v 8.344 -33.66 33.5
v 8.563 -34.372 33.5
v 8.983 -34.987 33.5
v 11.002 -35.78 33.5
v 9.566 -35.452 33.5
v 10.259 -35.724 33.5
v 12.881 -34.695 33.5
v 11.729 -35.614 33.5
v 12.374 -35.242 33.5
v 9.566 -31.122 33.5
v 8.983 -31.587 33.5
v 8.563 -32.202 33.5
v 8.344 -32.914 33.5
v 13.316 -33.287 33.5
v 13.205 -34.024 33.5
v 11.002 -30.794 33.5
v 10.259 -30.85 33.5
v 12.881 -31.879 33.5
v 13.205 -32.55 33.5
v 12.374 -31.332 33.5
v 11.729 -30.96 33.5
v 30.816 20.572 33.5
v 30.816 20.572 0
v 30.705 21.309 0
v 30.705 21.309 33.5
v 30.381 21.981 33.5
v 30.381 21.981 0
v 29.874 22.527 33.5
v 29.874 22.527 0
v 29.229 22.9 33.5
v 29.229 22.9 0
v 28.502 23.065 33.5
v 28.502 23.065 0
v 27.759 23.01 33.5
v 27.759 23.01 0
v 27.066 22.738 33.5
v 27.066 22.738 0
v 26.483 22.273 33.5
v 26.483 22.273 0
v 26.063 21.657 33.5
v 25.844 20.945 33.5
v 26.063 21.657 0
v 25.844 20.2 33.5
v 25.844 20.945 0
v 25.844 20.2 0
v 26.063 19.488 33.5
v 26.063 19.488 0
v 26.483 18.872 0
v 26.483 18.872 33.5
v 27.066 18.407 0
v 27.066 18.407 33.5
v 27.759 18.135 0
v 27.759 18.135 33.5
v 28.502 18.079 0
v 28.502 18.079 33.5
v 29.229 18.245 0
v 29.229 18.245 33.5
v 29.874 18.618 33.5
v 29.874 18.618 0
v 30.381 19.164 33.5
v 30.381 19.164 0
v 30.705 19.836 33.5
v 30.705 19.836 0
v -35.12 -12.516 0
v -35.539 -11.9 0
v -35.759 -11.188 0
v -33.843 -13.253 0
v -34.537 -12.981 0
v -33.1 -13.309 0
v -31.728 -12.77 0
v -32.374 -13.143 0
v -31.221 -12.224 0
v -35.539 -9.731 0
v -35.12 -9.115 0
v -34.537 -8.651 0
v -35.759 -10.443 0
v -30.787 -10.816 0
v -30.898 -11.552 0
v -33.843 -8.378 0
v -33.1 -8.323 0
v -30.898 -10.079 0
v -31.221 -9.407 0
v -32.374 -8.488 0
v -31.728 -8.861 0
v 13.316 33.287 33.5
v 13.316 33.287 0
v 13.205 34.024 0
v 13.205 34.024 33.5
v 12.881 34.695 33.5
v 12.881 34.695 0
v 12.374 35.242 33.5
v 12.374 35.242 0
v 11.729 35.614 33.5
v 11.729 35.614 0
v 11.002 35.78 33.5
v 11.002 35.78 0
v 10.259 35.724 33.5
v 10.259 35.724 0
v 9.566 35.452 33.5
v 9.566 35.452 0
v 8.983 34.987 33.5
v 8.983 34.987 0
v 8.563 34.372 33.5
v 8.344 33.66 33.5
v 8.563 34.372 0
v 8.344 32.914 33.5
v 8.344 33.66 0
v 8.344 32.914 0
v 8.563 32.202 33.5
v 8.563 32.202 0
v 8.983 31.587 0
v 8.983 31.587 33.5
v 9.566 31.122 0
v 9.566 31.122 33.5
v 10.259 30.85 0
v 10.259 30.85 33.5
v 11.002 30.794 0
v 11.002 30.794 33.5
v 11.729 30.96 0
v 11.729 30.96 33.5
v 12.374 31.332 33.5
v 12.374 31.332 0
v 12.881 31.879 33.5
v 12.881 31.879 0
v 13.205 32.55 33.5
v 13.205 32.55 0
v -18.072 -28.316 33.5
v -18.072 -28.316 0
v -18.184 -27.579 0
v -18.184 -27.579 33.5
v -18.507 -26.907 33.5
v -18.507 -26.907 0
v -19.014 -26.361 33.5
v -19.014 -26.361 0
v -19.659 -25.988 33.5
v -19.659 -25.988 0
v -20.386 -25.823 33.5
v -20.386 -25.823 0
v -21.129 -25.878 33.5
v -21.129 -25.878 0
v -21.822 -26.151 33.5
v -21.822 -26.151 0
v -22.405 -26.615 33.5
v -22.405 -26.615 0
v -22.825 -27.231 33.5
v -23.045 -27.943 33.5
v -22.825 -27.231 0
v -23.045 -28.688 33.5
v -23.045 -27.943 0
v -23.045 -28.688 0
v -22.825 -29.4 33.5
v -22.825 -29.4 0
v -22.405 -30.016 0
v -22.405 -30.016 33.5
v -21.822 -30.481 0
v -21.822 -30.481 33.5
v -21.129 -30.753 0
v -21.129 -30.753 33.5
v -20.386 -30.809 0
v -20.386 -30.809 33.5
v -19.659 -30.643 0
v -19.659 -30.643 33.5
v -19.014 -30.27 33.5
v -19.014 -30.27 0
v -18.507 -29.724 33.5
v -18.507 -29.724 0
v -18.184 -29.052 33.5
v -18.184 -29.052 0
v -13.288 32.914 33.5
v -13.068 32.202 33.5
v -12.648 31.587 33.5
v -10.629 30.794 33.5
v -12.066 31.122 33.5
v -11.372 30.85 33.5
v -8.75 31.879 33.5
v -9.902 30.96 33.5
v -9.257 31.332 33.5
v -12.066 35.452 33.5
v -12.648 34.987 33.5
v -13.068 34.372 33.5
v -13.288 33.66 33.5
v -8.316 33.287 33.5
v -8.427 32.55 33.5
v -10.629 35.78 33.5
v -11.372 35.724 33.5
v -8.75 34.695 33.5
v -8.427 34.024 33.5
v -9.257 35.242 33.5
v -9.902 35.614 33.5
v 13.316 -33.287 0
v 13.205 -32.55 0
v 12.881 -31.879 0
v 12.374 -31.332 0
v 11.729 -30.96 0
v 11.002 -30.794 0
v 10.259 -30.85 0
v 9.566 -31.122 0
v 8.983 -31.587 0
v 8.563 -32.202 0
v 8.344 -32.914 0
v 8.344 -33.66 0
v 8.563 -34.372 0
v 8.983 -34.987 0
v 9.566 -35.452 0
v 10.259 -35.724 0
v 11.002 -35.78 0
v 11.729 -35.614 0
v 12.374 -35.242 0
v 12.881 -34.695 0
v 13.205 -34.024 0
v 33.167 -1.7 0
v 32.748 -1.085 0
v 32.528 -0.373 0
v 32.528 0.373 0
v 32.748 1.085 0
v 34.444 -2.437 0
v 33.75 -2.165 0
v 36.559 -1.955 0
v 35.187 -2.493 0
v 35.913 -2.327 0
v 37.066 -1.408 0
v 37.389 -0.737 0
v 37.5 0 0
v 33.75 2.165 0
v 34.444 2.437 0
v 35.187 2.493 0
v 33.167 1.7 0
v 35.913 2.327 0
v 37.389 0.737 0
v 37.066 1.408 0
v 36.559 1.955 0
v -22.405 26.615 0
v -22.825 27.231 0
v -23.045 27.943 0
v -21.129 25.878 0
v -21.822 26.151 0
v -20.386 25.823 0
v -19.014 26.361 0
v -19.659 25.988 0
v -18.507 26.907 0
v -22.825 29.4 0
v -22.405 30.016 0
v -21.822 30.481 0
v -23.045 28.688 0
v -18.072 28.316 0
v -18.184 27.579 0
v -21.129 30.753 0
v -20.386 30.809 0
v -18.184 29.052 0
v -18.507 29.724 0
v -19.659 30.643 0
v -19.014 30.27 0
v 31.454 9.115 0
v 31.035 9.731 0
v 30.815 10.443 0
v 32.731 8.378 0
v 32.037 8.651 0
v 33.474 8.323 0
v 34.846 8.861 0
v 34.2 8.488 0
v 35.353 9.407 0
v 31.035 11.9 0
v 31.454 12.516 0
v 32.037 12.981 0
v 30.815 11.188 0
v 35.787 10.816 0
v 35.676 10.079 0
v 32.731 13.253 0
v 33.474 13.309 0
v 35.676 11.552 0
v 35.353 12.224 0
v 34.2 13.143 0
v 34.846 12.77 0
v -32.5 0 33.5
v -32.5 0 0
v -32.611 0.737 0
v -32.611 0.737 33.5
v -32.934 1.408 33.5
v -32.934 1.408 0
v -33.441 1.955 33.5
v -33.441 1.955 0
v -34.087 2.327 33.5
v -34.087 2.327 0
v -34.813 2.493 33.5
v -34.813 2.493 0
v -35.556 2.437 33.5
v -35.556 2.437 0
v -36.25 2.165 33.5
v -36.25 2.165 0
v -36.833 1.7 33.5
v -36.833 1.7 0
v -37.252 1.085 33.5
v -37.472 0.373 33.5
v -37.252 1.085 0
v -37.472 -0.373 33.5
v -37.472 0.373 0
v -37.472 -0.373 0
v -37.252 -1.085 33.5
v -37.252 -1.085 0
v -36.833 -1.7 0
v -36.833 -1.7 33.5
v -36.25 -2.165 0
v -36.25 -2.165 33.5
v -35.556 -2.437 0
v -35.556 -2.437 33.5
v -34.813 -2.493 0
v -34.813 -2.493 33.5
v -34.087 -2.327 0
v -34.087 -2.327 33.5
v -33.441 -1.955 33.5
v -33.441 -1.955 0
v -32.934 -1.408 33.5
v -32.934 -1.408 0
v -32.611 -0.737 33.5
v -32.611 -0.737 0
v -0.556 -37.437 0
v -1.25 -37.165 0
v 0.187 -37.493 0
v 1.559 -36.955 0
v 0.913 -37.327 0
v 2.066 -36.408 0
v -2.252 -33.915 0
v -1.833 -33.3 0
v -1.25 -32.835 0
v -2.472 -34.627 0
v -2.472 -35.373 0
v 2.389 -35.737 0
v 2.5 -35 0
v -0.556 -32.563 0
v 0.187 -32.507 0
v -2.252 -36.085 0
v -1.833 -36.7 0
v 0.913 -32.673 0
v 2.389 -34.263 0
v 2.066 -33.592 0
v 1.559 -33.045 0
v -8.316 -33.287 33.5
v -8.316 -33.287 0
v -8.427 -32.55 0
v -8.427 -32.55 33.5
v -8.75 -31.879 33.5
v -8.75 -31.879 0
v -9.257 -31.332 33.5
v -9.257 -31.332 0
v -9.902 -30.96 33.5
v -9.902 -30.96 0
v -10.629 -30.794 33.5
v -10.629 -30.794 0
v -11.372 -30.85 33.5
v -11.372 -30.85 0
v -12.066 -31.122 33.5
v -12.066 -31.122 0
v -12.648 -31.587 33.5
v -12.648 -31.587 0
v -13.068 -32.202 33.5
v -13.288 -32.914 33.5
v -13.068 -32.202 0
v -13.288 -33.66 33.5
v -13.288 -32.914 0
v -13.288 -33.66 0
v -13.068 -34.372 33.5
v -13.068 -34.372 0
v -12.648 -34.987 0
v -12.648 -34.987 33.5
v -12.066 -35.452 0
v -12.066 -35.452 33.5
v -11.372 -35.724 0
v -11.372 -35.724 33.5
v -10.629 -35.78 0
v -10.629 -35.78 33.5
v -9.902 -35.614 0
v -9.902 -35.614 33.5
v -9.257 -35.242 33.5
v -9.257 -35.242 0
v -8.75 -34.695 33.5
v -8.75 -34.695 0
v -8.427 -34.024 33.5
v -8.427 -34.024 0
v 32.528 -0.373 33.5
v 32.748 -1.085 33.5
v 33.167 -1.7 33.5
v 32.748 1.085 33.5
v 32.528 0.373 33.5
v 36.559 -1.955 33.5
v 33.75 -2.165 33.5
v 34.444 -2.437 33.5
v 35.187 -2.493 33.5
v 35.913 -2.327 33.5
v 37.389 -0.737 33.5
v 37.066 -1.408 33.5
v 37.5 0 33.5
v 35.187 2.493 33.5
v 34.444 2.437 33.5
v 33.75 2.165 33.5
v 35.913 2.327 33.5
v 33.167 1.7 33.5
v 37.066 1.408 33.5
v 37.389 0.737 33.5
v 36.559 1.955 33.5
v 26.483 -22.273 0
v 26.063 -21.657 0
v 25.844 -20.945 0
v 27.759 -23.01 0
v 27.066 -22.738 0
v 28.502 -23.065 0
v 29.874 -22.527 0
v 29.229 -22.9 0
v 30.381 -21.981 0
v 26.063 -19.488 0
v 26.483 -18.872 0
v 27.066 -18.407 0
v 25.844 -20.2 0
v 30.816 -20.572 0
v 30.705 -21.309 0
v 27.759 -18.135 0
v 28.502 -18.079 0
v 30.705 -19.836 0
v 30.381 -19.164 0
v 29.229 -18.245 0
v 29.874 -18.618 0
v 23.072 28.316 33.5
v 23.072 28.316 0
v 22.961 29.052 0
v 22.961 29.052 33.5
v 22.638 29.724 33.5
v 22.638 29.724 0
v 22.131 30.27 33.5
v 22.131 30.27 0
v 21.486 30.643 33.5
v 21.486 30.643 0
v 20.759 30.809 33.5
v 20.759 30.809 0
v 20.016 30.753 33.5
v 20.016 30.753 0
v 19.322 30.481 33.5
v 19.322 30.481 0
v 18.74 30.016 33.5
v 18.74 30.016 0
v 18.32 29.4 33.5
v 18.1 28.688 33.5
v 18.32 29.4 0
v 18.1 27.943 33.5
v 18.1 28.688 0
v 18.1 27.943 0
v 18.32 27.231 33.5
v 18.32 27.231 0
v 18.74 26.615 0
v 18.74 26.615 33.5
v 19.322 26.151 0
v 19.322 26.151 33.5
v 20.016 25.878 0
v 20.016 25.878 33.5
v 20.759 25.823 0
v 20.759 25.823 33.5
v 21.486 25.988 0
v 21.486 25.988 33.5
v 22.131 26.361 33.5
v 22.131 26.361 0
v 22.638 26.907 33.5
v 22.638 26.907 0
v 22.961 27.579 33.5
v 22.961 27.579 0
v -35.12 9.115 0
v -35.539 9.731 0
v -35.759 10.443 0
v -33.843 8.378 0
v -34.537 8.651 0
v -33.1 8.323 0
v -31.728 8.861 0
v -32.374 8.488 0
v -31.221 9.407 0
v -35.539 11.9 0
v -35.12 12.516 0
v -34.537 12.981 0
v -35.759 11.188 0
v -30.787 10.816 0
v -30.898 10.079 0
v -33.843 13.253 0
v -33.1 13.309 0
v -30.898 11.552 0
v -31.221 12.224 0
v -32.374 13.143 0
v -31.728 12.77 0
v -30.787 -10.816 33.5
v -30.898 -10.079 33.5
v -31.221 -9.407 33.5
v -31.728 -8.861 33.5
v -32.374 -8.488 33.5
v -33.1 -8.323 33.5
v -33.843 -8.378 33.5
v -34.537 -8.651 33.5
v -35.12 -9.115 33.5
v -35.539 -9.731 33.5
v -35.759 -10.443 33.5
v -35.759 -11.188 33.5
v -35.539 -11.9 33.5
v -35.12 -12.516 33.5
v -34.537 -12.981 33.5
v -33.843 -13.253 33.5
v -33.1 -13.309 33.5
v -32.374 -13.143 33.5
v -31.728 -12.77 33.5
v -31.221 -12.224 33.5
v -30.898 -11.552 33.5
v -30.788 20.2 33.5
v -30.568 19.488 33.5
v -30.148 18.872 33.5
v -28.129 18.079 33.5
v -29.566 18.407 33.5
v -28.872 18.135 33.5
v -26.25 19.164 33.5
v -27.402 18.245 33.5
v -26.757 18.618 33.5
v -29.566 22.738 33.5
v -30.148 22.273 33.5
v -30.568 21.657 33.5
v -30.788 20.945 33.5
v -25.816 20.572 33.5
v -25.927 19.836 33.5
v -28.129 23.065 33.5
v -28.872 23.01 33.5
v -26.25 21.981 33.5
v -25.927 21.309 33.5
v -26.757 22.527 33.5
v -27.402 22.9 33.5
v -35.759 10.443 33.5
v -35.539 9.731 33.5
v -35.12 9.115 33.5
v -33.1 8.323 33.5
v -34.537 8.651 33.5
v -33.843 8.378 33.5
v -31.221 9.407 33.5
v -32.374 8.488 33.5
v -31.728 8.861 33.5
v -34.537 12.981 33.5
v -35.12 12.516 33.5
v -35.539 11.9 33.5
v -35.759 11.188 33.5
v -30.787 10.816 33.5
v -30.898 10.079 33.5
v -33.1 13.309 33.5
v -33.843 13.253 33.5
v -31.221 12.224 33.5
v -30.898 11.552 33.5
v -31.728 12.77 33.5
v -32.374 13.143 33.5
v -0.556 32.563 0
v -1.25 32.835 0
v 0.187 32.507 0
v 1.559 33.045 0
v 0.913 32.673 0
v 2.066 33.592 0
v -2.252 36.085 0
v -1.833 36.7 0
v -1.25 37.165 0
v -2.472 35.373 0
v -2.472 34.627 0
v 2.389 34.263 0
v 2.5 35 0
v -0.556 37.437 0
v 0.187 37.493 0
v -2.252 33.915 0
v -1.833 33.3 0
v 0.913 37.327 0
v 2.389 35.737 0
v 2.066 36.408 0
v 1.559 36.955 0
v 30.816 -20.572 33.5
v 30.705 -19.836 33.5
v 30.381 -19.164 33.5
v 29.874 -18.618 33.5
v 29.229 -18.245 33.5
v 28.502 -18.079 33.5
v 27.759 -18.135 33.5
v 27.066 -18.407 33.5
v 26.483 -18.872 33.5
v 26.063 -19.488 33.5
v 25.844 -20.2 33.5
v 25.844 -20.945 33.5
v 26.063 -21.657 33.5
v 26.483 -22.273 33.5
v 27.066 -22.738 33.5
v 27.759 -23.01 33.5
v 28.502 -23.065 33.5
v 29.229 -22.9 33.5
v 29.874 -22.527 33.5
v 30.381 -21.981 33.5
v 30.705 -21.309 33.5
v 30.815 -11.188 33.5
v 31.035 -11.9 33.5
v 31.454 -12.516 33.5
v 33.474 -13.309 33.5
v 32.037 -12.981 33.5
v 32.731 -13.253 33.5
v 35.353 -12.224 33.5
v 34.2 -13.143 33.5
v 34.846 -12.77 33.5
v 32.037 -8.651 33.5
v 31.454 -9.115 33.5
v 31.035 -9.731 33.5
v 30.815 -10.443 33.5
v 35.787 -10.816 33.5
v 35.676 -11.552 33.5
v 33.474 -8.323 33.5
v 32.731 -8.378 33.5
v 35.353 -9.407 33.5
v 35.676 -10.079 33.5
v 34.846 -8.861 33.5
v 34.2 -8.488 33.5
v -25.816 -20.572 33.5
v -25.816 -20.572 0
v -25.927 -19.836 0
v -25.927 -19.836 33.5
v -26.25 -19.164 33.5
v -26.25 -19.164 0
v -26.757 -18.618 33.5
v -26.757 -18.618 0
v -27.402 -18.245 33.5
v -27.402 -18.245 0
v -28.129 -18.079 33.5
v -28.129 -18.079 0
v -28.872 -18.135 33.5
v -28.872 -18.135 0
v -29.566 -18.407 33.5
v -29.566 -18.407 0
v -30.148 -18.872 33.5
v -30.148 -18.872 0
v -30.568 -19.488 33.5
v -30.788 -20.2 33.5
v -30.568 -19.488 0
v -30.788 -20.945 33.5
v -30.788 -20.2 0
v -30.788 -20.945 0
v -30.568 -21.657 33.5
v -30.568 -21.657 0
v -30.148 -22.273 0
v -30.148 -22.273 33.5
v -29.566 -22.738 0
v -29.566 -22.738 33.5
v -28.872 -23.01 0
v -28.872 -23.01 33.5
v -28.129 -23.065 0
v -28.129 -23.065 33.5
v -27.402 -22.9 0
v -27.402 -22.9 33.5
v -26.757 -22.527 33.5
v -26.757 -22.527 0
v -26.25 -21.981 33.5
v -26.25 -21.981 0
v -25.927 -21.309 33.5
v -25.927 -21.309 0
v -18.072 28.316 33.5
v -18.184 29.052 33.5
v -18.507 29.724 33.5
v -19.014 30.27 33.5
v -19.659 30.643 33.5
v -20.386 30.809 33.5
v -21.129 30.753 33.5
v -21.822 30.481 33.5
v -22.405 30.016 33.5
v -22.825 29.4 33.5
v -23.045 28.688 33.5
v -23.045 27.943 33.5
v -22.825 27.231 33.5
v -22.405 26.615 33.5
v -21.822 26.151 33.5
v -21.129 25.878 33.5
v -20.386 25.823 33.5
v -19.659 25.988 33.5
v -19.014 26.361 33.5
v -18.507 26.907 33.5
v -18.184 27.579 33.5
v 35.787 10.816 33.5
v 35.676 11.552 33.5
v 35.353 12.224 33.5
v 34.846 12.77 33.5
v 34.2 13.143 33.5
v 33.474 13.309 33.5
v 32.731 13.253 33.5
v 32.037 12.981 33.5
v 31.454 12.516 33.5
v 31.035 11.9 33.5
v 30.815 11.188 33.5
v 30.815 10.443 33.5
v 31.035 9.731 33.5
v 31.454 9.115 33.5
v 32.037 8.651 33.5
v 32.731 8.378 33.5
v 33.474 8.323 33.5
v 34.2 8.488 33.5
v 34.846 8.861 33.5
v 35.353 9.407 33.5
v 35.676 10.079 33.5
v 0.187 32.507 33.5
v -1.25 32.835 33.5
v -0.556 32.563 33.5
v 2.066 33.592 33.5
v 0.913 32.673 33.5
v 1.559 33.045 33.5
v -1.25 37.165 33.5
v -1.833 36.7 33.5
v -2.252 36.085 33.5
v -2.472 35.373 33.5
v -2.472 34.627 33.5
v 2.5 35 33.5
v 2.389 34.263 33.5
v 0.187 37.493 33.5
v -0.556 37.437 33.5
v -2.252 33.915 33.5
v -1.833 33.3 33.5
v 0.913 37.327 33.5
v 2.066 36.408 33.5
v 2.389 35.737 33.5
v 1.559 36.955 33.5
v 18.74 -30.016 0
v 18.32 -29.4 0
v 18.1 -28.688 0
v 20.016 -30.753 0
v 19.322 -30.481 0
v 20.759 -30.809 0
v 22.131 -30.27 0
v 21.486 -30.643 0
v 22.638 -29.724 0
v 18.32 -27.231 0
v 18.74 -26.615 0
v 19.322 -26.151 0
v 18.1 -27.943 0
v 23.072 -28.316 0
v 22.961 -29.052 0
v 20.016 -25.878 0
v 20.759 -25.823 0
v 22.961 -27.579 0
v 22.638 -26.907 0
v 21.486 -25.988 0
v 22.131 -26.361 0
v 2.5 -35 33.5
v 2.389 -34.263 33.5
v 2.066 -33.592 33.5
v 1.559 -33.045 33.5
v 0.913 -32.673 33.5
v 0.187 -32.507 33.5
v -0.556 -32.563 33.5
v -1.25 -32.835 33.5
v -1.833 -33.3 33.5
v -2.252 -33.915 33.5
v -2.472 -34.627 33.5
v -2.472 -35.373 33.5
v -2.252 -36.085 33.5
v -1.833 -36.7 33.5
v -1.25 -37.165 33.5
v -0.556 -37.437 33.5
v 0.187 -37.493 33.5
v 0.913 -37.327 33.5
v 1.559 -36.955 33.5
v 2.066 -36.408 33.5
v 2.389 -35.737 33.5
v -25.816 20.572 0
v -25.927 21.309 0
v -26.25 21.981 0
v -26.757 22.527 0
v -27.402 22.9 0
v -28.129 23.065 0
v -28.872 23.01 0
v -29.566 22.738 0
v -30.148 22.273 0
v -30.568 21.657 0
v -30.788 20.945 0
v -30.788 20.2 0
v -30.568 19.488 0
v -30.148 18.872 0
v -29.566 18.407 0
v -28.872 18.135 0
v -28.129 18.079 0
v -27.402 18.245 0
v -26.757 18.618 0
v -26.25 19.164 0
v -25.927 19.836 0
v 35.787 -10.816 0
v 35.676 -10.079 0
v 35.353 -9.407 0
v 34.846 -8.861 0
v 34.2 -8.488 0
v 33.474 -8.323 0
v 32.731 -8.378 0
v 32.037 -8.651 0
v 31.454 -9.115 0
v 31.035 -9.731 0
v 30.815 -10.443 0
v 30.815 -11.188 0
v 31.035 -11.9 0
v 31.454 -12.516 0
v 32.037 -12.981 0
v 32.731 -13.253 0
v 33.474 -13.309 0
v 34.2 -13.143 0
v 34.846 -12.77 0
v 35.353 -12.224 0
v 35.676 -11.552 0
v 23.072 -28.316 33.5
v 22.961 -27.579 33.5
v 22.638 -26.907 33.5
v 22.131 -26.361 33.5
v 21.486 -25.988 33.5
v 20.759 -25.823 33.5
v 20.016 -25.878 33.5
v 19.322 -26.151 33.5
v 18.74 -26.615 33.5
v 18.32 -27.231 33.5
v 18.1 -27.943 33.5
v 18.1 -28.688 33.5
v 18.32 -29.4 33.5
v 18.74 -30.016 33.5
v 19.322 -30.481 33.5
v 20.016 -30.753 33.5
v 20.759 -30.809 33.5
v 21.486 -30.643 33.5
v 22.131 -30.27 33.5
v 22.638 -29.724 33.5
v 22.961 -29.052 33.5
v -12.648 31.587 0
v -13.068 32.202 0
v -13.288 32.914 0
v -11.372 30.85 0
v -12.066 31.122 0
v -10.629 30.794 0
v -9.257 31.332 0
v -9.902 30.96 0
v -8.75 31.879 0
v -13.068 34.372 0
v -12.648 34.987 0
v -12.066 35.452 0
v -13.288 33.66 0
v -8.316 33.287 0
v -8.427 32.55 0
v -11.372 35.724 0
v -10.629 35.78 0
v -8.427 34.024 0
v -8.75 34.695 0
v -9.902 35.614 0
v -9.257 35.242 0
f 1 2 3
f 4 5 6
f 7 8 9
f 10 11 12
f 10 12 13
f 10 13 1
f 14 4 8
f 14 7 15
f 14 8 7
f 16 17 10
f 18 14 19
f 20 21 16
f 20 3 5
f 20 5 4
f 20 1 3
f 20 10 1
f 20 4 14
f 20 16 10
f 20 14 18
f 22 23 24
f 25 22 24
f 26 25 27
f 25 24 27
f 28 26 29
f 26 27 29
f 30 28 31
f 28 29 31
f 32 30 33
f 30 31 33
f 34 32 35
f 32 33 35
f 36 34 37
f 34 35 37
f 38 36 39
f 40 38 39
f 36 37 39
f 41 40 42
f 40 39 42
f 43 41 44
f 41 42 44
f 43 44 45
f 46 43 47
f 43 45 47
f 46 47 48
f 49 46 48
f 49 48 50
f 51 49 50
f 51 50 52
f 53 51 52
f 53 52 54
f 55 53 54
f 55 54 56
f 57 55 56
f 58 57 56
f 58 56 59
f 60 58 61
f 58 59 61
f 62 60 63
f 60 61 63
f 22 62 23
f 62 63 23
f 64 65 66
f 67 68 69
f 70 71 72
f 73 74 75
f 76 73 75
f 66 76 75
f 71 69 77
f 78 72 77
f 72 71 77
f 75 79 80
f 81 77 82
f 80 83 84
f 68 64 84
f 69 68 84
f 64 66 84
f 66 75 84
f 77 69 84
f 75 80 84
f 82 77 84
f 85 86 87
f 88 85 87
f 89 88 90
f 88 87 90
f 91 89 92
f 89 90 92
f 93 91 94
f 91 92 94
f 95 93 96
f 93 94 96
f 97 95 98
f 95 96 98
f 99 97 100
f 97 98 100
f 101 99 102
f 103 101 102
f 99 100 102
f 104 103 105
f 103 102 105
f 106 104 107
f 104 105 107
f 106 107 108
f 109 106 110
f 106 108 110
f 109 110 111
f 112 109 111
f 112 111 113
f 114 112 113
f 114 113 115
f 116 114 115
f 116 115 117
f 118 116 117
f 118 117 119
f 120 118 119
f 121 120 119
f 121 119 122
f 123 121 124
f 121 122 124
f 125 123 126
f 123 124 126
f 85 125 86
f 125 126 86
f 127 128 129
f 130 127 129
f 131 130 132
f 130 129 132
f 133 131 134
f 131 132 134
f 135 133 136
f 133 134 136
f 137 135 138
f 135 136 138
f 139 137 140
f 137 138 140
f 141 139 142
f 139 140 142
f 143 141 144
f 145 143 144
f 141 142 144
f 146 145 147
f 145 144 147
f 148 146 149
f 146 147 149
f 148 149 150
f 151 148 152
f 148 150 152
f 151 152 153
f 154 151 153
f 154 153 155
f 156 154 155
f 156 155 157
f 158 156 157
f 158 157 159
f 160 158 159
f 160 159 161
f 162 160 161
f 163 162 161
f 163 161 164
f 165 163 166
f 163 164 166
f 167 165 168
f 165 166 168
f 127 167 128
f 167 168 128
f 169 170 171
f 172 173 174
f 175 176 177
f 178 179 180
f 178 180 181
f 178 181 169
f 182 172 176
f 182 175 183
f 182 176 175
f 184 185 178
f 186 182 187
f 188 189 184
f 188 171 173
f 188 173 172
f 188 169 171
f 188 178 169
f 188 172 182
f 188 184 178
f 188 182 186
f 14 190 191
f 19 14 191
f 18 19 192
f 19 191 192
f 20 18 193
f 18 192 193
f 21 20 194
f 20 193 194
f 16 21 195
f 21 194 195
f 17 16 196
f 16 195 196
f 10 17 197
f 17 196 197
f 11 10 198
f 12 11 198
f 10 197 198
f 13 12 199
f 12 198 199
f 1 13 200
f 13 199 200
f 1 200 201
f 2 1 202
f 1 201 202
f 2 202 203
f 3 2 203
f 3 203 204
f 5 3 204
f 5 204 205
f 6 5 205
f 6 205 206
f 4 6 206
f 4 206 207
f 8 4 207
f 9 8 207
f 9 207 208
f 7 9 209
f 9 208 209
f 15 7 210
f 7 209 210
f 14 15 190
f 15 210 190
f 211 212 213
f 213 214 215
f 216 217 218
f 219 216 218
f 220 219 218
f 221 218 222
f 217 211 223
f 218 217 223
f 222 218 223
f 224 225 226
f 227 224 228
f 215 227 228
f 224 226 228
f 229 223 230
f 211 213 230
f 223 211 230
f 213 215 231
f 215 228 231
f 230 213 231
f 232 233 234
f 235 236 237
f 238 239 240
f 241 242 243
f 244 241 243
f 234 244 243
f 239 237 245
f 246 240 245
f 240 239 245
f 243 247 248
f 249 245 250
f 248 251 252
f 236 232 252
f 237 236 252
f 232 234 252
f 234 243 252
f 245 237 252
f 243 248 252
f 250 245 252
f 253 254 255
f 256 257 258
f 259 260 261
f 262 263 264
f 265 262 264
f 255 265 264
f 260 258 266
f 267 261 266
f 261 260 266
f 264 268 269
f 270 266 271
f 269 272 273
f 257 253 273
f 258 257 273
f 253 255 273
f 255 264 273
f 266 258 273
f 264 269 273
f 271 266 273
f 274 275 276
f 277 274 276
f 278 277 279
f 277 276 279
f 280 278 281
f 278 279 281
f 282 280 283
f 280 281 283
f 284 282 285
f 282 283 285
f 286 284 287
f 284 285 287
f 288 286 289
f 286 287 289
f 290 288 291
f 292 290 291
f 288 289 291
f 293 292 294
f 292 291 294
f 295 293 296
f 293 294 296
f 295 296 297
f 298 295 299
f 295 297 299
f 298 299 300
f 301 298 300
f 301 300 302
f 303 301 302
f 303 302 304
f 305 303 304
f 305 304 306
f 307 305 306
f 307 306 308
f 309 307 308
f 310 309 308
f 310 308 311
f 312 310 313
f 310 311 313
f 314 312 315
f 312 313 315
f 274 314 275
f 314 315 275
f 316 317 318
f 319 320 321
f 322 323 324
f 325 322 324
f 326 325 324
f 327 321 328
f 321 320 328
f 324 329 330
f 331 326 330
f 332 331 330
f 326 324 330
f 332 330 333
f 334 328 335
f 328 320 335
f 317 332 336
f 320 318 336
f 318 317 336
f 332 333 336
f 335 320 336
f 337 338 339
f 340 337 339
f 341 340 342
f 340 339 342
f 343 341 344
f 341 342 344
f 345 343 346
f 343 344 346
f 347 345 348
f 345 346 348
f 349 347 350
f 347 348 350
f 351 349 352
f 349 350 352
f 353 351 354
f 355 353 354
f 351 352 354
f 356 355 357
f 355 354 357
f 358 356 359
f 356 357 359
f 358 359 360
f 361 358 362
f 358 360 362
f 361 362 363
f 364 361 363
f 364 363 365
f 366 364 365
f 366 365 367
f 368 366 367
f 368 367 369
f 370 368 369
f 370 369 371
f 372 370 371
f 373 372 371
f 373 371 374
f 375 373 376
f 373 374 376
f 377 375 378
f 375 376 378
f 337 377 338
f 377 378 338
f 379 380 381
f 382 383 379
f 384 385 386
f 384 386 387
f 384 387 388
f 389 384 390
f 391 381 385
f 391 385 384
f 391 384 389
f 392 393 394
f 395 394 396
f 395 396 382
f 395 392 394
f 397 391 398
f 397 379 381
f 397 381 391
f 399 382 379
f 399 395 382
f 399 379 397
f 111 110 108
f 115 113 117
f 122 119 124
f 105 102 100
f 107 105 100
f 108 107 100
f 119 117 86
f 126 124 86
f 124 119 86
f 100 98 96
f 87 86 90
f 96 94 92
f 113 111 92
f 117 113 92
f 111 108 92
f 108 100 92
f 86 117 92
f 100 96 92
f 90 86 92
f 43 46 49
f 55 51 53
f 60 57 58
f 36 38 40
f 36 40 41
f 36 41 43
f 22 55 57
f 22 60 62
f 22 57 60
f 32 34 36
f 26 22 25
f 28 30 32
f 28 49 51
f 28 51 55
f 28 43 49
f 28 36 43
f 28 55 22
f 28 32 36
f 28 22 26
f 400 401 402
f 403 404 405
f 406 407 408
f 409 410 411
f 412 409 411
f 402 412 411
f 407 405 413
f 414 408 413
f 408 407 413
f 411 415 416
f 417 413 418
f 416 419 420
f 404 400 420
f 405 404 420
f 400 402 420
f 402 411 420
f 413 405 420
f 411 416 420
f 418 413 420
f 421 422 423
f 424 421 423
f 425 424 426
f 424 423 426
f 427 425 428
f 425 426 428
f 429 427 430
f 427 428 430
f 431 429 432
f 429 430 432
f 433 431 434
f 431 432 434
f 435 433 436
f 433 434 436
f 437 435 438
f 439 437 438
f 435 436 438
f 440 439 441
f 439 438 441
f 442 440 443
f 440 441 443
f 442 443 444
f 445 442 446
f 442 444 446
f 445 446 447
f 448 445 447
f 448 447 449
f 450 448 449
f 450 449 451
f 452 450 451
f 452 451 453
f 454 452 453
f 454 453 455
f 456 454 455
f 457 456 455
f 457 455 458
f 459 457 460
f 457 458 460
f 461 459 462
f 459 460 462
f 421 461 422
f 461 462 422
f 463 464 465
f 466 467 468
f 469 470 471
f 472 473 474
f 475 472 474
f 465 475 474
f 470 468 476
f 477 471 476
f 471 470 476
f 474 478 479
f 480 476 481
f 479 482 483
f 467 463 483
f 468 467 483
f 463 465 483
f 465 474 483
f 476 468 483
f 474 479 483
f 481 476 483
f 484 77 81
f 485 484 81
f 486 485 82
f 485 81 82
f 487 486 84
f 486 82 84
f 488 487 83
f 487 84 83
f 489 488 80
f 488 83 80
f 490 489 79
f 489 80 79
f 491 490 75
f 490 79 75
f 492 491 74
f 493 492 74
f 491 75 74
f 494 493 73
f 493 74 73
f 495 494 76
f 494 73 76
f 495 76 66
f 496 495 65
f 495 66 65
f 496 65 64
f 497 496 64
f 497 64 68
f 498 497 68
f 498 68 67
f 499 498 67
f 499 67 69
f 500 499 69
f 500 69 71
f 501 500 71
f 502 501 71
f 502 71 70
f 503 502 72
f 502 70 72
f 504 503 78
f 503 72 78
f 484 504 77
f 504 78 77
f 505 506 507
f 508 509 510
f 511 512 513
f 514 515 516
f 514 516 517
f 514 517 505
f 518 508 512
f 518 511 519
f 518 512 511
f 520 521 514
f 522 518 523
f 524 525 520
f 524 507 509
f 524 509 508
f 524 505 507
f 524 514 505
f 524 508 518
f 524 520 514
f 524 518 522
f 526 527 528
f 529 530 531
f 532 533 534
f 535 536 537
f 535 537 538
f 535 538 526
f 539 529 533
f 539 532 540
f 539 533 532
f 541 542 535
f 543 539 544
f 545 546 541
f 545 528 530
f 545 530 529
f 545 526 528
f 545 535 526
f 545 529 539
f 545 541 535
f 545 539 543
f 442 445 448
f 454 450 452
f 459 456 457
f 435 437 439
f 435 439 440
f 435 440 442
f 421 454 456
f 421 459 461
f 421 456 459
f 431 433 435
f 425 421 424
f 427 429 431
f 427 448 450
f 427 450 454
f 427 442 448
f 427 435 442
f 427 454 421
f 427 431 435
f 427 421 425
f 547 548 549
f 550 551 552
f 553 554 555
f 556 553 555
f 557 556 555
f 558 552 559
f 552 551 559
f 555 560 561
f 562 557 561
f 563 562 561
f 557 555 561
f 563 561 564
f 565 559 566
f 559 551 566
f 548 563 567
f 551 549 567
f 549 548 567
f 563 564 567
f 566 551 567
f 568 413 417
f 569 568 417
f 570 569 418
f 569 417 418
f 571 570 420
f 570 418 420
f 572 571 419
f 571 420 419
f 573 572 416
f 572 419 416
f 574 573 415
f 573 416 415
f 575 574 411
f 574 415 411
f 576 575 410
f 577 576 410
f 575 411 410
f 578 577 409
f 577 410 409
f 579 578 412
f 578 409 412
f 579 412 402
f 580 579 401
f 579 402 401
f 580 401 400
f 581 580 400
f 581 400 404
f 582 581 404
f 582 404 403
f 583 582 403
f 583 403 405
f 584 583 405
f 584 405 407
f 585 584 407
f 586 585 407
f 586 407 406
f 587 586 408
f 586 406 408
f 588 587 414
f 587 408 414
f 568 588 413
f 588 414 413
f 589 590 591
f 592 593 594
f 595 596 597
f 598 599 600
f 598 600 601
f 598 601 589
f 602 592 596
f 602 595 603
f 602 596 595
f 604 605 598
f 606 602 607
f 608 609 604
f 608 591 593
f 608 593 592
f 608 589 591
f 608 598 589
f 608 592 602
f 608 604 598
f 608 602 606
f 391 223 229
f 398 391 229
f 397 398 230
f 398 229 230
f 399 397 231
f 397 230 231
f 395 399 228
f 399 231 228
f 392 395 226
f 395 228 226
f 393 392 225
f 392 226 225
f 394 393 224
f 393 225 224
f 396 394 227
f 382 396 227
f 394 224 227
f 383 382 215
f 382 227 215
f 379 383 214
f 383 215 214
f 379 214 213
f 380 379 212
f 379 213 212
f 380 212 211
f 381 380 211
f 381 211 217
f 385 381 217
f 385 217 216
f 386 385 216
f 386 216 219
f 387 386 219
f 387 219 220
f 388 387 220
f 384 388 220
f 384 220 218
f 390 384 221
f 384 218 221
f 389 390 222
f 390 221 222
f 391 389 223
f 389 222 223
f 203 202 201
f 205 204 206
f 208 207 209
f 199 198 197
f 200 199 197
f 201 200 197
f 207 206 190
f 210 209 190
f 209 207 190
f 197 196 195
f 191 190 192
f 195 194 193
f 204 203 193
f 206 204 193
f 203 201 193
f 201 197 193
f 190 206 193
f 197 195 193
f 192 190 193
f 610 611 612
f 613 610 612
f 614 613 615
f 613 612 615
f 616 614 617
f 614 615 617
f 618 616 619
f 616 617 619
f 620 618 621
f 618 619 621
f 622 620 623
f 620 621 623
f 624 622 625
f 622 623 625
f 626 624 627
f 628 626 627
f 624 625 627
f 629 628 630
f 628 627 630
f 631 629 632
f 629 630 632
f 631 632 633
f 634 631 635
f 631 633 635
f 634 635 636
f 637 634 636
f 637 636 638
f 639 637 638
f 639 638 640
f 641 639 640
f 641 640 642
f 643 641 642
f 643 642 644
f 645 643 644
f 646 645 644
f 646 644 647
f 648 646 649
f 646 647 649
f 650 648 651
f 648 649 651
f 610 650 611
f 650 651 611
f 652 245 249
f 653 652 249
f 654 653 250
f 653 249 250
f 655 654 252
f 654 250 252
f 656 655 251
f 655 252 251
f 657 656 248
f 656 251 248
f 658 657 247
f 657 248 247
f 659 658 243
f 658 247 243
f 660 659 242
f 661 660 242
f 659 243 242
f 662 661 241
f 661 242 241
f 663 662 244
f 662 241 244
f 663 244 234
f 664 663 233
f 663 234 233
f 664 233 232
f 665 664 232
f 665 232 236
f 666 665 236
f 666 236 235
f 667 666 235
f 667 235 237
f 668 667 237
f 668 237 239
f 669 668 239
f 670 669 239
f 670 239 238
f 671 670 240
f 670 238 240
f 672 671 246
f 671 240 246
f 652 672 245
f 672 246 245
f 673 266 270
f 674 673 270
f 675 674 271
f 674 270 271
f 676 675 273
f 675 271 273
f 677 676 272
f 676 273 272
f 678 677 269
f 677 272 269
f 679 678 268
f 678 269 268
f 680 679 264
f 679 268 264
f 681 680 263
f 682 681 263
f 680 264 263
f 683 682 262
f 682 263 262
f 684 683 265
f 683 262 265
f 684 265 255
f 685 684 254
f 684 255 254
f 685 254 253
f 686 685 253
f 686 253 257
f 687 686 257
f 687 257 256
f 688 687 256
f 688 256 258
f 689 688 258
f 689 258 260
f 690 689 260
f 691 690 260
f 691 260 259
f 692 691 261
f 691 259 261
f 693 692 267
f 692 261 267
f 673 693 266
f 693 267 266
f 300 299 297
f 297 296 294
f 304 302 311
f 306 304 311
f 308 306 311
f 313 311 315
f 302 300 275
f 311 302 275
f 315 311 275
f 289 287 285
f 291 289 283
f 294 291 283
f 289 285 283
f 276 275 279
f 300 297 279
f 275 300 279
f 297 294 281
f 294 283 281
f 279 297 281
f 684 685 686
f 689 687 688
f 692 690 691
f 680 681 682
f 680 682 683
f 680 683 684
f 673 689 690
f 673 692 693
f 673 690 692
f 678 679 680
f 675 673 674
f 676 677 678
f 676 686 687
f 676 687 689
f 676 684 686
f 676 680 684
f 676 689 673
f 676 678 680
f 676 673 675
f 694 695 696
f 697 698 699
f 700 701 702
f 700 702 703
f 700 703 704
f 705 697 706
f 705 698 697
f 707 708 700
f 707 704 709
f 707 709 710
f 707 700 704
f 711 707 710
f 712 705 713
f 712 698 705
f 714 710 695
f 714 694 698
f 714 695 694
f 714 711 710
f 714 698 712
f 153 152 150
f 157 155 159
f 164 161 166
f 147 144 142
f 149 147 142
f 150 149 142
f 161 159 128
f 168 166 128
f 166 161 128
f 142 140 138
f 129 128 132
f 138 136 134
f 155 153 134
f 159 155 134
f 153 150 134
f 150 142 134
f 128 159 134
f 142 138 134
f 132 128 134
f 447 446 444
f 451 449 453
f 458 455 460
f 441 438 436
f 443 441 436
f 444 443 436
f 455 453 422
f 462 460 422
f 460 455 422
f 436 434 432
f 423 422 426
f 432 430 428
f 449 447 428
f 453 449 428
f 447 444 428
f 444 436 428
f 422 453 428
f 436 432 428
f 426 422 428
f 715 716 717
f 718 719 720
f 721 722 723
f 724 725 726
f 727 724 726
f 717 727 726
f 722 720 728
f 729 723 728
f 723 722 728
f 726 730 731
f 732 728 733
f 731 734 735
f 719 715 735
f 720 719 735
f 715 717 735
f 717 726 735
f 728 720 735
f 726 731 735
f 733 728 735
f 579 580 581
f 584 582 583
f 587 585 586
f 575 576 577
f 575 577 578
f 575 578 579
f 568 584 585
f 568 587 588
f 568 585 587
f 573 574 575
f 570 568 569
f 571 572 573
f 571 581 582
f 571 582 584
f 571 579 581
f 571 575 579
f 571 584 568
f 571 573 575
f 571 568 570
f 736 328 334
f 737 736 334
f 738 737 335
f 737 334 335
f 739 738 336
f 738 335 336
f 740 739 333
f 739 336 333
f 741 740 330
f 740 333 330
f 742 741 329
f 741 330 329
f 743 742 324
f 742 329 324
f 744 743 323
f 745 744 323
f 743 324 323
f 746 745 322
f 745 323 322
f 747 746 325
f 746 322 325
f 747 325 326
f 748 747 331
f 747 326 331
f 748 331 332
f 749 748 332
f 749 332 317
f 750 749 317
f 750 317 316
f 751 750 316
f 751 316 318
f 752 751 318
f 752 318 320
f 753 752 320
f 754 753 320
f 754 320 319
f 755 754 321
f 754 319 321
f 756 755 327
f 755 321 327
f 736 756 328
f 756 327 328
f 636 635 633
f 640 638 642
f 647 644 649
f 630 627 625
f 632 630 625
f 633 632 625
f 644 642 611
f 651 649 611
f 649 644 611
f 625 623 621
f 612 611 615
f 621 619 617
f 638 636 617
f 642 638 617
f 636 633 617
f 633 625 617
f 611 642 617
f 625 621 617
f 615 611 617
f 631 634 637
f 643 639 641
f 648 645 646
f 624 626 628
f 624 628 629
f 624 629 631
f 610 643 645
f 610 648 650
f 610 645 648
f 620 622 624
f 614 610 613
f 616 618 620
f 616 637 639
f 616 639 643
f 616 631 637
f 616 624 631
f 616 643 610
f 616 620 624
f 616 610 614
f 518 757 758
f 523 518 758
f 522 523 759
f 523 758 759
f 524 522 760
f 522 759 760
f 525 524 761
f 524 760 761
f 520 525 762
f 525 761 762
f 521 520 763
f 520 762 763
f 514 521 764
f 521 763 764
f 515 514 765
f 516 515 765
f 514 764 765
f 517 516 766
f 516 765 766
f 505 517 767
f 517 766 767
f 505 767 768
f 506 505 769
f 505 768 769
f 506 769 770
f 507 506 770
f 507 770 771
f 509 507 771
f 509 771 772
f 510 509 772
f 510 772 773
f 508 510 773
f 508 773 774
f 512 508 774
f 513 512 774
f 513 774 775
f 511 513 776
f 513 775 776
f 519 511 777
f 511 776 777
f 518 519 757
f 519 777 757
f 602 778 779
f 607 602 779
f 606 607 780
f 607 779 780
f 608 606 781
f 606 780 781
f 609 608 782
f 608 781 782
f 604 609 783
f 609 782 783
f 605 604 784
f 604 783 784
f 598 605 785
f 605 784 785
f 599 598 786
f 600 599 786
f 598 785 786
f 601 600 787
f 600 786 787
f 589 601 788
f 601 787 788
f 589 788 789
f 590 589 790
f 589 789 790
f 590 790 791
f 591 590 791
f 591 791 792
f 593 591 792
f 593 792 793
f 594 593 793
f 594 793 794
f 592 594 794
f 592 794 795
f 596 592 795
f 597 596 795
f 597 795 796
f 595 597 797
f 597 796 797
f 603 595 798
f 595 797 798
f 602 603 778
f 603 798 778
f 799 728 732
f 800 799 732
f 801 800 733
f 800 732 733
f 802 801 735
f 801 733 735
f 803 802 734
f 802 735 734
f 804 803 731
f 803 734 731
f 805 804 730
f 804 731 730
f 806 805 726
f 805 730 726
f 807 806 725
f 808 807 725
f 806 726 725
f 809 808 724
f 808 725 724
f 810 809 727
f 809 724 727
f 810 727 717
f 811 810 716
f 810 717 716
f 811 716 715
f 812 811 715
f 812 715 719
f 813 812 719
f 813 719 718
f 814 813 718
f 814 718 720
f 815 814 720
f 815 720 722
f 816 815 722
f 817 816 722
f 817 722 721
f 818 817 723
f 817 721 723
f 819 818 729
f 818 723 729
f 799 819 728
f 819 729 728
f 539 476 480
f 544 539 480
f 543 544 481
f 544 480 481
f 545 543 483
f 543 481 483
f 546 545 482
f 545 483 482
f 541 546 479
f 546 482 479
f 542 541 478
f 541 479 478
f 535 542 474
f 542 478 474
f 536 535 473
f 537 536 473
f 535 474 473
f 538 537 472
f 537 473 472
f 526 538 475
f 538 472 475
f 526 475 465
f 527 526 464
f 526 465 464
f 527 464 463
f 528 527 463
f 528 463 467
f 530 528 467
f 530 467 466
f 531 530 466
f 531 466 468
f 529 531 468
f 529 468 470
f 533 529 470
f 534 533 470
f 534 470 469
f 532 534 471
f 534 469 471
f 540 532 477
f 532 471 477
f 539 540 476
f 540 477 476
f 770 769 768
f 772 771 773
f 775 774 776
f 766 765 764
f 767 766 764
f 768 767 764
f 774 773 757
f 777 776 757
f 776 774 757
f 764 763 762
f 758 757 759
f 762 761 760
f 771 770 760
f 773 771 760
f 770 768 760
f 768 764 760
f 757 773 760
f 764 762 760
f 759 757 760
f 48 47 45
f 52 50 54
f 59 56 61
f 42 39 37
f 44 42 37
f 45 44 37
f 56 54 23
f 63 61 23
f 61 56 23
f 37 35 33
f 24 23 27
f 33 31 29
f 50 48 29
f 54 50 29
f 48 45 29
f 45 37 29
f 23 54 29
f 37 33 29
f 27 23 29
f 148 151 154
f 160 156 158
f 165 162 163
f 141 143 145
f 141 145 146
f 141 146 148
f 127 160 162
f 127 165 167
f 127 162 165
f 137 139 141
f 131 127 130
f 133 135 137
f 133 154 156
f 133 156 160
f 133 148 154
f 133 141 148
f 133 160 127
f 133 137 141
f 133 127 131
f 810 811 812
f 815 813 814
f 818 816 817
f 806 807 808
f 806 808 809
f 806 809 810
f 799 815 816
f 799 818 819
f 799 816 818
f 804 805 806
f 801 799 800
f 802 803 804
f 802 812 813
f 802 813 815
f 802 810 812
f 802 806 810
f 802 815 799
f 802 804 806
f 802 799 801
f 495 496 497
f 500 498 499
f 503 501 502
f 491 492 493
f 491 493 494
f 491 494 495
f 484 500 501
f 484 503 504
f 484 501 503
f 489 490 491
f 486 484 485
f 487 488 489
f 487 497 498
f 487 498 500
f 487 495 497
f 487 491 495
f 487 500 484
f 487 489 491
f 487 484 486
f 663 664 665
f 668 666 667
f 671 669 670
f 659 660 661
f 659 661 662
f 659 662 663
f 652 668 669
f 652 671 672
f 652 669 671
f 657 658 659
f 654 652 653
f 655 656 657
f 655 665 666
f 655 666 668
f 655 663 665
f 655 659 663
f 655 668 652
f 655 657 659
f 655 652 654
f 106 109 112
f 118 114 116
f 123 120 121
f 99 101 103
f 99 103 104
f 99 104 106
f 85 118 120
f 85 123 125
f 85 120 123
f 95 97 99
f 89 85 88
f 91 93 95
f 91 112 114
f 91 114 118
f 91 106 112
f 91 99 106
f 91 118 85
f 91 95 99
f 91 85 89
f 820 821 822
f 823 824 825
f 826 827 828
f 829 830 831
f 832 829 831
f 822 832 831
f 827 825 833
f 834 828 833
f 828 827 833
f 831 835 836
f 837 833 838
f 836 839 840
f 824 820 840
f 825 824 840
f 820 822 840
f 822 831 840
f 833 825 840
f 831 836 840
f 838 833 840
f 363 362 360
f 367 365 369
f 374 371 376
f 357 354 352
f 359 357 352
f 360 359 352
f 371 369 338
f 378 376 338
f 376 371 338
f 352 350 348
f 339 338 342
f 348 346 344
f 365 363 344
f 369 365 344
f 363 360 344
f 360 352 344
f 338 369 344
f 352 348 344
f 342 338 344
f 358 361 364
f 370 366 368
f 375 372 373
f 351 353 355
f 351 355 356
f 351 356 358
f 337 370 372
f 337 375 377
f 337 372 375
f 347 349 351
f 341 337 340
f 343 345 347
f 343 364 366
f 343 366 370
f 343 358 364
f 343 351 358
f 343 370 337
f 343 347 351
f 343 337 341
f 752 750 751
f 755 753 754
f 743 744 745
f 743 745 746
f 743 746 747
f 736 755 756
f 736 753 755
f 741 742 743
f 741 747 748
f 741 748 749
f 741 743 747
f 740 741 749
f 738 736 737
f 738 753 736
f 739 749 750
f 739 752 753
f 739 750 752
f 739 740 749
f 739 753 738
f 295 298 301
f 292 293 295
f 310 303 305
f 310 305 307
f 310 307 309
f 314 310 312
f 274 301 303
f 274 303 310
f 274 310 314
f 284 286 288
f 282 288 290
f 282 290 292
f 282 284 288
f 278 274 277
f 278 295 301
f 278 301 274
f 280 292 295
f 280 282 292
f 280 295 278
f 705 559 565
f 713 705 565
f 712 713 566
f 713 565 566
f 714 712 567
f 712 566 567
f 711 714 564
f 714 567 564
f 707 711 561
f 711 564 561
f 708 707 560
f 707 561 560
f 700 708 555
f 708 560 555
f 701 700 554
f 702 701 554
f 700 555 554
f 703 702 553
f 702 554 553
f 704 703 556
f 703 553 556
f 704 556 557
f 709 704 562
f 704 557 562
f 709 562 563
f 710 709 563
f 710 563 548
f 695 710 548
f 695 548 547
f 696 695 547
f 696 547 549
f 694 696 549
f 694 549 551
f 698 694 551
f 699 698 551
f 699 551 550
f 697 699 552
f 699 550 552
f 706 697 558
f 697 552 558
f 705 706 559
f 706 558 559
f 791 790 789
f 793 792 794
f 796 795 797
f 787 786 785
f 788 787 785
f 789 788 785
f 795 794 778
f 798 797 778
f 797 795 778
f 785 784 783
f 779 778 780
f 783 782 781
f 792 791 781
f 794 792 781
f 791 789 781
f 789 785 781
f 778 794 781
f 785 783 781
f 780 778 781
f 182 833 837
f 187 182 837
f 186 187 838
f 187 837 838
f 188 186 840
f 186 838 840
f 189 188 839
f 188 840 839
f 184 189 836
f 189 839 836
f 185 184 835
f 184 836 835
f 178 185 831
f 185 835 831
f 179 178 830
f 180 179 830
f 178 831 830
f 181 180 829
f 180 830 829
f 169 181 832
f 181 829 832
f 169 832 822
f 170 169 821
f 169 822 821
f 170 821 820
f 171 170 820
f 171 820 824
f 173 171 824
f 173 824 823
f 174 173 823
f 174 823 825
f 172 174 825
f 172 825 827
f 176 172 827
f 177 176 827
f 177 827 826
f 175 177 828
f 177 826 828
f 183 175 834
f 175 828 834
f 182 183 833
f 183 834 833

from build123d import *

# Parameters (mm, degrees)
SKETCH1_R              = 2.5
BOSS_EXTRUDE1_DEPTH    = 33.5
BOSS_EXTRUDE1_2_DEPTH  = 33.5
BOSS_EXTRUDE1_3_DEPTH  = 33.5
BOSS_EXTRUDE1_4_DEPTH  = 33.5
BOSS_EXTRUDE1_5_DEPTH  = 33.5
BOSS_EXTRUDE1_6_DEPTH  = 33.5
BOSS_EXTRUDE1_7_DEPTH  = 33.5
BOSS_EXTRUDE1_8_DEPTH  = 33.5
BOSS_EXTRUDE1_9_DEPTH  = 33.5
BOSS_EXTRUDE1_10_DEPTH = 33.5
BOSS_EXTRUDE1_11_DEPTH = 33.5
BOSS_EXTRUDE1_12_DEPTH = 33.5
BOSS_EXTRUDE1_13_DEPTH = 33.5
BOSS_EXTRUDE1_14_DEPTH = 33.5
BOSS_EXTRUDE1_15_DEPTH = 33.5
BOSS_EXTRUDE1_16_DEPTH = 33.5
BOSS_EXTRUDE1_17_DEPTH = 33.5
BOSS_EXTRUDE1_18_DEPTH = 33.5
BOSS_EXTRUDE1_19_DEPTH = 33.5
BOSS_EXTRUDE1_20_DEPTH = 33.5


with BuildPart() as part:
    # Sketch1 → Boss-Extrude1 (new body)
    with BuildSketch(Plane.XY):
        with Locations((0, 35)):
            Circle(SKETCH1_R)
    extrude(amount=BOSS_EXTRUDE1_DEPTH)


with BuildPart() as body_2:
    # Sketch1 → Boss-Extrude1 2 (new body)
    with BuildSketch(Plane.XY):
        with Locations((10.815594803, 33.28697807)):
            Circle(SKETCH1_R)
    extrude(amount=BOSS_EXTRUDE1_2_DEPTH)


with BuildPart() as body_3:
    # Sketch1 → Boss-Extrude1 3 (new body)
    with BuildSketch(Plane.XY):
        with Locations((20.57248383, 28.315594803)):
            Circle(SKETCH1_R)
    extrude(amount=BOSS_EXTRUDE1_3_DEPTH)


with BuildPart() as body_4:
    # Sketch1 → Boss-Extrude1 4 (new body)
    with BuildSketch(Plane.XY):
        with Locations((28.315594803, 20.57248383)):
            Circle(SKETCH1_R)
    extrude(amount=BOSS_EXTRUDE1_4_DEPTH)


with BuildPart() as body_5:
    # Sketch1 → Boss-Extrude1 5 (new body)
    with BuildSketch(Plane.XY):
        with Locations((33.28697807, 10.815594803)):
            Circle(SKETCH1_R)
    extrude(amount=BOSS_EXTRUDE1_5_DEPTH)


with BuildPart() as body_6:
    # Sketch1 → Boss-Extrude1 6 (new body)
    with BuildSketch(Plane.XY):
        with Locations((35, 0)):
            Circle(SKETCH1_R)
    extrude(amount=BOSS_EXTRUDE1_6_DEPTH)


with BuildPart() as body_7:
    # Sketch1 → Boss-Extrude1 7 (new body)
    with BuildSketch(Plane.XY):
        with Locations((33.28697807, -10.815594803)):
            Circle(SKETCH1_R)
    extrude(amount=BOSS_EXTRUDE1_7_DEPTH)


with BuildPart() as body_8:
    # Sketch1 → Boss-Extrude1 8 (new body)
    with BuildSketch(Plane.XY):
        with Locations((28.315594803, -20.57248383)):
            Circle(SKETCH1_R)
    extrude(amount=BOSS_EXTRUDE1_8_DEPTH)


with BuildPart() as body_9:
    # Sketch1 → Boss-Extrude1 9 (new body)
    with BuildSketch(Plane.XY):
        with Locations((20.57248383, -28.315594803)):
            Circle(SKETCH1_R)
    extrude(amount=BOSS_EXTRUDE1_9_DEPTH)


with BuildPart() as body_10:
    # Sketch1 → Boss-Extrude1 10 (new body)
    with BuildSketch(Plane.XY):
        with Locations((10.815594803, -33.28697807)):
            Circle(SKETCH1_R)
    extrude(amount=BOSS_EXTRUDE1_10_DEPTH)


with BuildPart() as body_11:
    # Sketch1 → Boss-Extrude1 11 (new body)
    with BuildSketch(Plane.XY):
        with Locations((0, -35)):
            Circle(SKETCH1_R)
    extrude(amount=BOSS_EXTRUDE1_11_DEPTH)


with BuildPart() as body_12:
    # Sketch1 → Boss-Extrude1 12 (new body)
    with BuildSketch(Plane.XY):
        with Locations((-10.815594803, -33.28697807)):
            Circle(SKETCH1_R)
    extrude(amount=BOSS_EXTRUDE1_12_DEPTH)


with BuildPart() as body_13:
    # Sketch1 → Boss-Extrude1 13 (new body)
    with BuildSketch(Plane.XY):
        with Locations((-20.57248383, -28.315594803)):
            Circle(SKETCH1_R)
    extrude(amount=BOSS_EXTRUDE1_13_DEPTH)


with BuildPart() as body_14:
    # Sketch1 → Boss-Extrude1 14 (new body)
    with BuildSketch(Plane.XY):
        with Locations((-28.315594803, -20.57248383)):
            Circle(SKETCH1_R)
    extrude(amount=BOSS_EXTRUDE1_14_DEPTH)


with BuildPart() as body_15:
    # Sketch1 → Boss-Extrude1 15 (new body)
    with BuildSketch(Plane.XY):
        with Locations((-33.28697807, -10.815594803)):
            Circle(SKETCH1_R)
    extrude(amount=BOSS_EXTRUDE1_15_DEPTH)


with BuildPart() as body_16:
    # Sketch1 → Boss-Extrude1 16 (new body)
    with BuildSketch(Plane.XY):
        with Locations((-35, 0)):
            Circle(SKETCH1_R)
    extrude(amount=BOSS_EXTRUDE1_16_DEPTH)


with BuildPart() as body_17:
    # Sketch1 → Boss-Extrude1 17 (new body)
    with BuildSketch(Plane.XY):
        with Locations((-33.28697807, 10.815594803)):
            Circle(SKETCH1_R)
    extrude(amount=BOSS_EXTRUDE1_17_DEPTH)


with BuildPart() as body_18:
    # Sketch1 → Boss-Extrude1 18 (new body)
    with BuildSketch(Plane.XY):
        with Locations((-28.315594803, 20.57248383)):
            Circle(SKETCH1_R)
    extrude(amount=BOSS_EXTRUDE1_18_DEPTH)


with BuildPart() as body_19:
    # Sketch1 → Boss-Extrude1 19 (new body)
    with BuildSketch(Plane.XY):
        with Locations((-20.57248383, 28.315594803)):
            Circle(SKETCH1_R)
    extrude(amount=BOSS_EXTRUDE1_19_DEPTH)


with BuildPart() as body_20:
    # Sketch1 → Boss-Extrude1 20 (new body)
    with BuildSketch(Plane.XY):
        with Locations((-10.815594803, 33.28697807)):
            Circle(SKETCH1_R)
    extrude(amount=BOSS_EXTRUDE1_20_DEPTH)


solid = Compound([part.part, body_2.part, body_3.part, body_4.part, body_5.part, body_6.part, body_7.part, body_8.part, body_9.part, body_10.part, body_11.part, body_12.part, body_13.part, body_14.part, body_15.part, body_16.part, body_17.part, body_18.part, body_19.part, body_20.part])
